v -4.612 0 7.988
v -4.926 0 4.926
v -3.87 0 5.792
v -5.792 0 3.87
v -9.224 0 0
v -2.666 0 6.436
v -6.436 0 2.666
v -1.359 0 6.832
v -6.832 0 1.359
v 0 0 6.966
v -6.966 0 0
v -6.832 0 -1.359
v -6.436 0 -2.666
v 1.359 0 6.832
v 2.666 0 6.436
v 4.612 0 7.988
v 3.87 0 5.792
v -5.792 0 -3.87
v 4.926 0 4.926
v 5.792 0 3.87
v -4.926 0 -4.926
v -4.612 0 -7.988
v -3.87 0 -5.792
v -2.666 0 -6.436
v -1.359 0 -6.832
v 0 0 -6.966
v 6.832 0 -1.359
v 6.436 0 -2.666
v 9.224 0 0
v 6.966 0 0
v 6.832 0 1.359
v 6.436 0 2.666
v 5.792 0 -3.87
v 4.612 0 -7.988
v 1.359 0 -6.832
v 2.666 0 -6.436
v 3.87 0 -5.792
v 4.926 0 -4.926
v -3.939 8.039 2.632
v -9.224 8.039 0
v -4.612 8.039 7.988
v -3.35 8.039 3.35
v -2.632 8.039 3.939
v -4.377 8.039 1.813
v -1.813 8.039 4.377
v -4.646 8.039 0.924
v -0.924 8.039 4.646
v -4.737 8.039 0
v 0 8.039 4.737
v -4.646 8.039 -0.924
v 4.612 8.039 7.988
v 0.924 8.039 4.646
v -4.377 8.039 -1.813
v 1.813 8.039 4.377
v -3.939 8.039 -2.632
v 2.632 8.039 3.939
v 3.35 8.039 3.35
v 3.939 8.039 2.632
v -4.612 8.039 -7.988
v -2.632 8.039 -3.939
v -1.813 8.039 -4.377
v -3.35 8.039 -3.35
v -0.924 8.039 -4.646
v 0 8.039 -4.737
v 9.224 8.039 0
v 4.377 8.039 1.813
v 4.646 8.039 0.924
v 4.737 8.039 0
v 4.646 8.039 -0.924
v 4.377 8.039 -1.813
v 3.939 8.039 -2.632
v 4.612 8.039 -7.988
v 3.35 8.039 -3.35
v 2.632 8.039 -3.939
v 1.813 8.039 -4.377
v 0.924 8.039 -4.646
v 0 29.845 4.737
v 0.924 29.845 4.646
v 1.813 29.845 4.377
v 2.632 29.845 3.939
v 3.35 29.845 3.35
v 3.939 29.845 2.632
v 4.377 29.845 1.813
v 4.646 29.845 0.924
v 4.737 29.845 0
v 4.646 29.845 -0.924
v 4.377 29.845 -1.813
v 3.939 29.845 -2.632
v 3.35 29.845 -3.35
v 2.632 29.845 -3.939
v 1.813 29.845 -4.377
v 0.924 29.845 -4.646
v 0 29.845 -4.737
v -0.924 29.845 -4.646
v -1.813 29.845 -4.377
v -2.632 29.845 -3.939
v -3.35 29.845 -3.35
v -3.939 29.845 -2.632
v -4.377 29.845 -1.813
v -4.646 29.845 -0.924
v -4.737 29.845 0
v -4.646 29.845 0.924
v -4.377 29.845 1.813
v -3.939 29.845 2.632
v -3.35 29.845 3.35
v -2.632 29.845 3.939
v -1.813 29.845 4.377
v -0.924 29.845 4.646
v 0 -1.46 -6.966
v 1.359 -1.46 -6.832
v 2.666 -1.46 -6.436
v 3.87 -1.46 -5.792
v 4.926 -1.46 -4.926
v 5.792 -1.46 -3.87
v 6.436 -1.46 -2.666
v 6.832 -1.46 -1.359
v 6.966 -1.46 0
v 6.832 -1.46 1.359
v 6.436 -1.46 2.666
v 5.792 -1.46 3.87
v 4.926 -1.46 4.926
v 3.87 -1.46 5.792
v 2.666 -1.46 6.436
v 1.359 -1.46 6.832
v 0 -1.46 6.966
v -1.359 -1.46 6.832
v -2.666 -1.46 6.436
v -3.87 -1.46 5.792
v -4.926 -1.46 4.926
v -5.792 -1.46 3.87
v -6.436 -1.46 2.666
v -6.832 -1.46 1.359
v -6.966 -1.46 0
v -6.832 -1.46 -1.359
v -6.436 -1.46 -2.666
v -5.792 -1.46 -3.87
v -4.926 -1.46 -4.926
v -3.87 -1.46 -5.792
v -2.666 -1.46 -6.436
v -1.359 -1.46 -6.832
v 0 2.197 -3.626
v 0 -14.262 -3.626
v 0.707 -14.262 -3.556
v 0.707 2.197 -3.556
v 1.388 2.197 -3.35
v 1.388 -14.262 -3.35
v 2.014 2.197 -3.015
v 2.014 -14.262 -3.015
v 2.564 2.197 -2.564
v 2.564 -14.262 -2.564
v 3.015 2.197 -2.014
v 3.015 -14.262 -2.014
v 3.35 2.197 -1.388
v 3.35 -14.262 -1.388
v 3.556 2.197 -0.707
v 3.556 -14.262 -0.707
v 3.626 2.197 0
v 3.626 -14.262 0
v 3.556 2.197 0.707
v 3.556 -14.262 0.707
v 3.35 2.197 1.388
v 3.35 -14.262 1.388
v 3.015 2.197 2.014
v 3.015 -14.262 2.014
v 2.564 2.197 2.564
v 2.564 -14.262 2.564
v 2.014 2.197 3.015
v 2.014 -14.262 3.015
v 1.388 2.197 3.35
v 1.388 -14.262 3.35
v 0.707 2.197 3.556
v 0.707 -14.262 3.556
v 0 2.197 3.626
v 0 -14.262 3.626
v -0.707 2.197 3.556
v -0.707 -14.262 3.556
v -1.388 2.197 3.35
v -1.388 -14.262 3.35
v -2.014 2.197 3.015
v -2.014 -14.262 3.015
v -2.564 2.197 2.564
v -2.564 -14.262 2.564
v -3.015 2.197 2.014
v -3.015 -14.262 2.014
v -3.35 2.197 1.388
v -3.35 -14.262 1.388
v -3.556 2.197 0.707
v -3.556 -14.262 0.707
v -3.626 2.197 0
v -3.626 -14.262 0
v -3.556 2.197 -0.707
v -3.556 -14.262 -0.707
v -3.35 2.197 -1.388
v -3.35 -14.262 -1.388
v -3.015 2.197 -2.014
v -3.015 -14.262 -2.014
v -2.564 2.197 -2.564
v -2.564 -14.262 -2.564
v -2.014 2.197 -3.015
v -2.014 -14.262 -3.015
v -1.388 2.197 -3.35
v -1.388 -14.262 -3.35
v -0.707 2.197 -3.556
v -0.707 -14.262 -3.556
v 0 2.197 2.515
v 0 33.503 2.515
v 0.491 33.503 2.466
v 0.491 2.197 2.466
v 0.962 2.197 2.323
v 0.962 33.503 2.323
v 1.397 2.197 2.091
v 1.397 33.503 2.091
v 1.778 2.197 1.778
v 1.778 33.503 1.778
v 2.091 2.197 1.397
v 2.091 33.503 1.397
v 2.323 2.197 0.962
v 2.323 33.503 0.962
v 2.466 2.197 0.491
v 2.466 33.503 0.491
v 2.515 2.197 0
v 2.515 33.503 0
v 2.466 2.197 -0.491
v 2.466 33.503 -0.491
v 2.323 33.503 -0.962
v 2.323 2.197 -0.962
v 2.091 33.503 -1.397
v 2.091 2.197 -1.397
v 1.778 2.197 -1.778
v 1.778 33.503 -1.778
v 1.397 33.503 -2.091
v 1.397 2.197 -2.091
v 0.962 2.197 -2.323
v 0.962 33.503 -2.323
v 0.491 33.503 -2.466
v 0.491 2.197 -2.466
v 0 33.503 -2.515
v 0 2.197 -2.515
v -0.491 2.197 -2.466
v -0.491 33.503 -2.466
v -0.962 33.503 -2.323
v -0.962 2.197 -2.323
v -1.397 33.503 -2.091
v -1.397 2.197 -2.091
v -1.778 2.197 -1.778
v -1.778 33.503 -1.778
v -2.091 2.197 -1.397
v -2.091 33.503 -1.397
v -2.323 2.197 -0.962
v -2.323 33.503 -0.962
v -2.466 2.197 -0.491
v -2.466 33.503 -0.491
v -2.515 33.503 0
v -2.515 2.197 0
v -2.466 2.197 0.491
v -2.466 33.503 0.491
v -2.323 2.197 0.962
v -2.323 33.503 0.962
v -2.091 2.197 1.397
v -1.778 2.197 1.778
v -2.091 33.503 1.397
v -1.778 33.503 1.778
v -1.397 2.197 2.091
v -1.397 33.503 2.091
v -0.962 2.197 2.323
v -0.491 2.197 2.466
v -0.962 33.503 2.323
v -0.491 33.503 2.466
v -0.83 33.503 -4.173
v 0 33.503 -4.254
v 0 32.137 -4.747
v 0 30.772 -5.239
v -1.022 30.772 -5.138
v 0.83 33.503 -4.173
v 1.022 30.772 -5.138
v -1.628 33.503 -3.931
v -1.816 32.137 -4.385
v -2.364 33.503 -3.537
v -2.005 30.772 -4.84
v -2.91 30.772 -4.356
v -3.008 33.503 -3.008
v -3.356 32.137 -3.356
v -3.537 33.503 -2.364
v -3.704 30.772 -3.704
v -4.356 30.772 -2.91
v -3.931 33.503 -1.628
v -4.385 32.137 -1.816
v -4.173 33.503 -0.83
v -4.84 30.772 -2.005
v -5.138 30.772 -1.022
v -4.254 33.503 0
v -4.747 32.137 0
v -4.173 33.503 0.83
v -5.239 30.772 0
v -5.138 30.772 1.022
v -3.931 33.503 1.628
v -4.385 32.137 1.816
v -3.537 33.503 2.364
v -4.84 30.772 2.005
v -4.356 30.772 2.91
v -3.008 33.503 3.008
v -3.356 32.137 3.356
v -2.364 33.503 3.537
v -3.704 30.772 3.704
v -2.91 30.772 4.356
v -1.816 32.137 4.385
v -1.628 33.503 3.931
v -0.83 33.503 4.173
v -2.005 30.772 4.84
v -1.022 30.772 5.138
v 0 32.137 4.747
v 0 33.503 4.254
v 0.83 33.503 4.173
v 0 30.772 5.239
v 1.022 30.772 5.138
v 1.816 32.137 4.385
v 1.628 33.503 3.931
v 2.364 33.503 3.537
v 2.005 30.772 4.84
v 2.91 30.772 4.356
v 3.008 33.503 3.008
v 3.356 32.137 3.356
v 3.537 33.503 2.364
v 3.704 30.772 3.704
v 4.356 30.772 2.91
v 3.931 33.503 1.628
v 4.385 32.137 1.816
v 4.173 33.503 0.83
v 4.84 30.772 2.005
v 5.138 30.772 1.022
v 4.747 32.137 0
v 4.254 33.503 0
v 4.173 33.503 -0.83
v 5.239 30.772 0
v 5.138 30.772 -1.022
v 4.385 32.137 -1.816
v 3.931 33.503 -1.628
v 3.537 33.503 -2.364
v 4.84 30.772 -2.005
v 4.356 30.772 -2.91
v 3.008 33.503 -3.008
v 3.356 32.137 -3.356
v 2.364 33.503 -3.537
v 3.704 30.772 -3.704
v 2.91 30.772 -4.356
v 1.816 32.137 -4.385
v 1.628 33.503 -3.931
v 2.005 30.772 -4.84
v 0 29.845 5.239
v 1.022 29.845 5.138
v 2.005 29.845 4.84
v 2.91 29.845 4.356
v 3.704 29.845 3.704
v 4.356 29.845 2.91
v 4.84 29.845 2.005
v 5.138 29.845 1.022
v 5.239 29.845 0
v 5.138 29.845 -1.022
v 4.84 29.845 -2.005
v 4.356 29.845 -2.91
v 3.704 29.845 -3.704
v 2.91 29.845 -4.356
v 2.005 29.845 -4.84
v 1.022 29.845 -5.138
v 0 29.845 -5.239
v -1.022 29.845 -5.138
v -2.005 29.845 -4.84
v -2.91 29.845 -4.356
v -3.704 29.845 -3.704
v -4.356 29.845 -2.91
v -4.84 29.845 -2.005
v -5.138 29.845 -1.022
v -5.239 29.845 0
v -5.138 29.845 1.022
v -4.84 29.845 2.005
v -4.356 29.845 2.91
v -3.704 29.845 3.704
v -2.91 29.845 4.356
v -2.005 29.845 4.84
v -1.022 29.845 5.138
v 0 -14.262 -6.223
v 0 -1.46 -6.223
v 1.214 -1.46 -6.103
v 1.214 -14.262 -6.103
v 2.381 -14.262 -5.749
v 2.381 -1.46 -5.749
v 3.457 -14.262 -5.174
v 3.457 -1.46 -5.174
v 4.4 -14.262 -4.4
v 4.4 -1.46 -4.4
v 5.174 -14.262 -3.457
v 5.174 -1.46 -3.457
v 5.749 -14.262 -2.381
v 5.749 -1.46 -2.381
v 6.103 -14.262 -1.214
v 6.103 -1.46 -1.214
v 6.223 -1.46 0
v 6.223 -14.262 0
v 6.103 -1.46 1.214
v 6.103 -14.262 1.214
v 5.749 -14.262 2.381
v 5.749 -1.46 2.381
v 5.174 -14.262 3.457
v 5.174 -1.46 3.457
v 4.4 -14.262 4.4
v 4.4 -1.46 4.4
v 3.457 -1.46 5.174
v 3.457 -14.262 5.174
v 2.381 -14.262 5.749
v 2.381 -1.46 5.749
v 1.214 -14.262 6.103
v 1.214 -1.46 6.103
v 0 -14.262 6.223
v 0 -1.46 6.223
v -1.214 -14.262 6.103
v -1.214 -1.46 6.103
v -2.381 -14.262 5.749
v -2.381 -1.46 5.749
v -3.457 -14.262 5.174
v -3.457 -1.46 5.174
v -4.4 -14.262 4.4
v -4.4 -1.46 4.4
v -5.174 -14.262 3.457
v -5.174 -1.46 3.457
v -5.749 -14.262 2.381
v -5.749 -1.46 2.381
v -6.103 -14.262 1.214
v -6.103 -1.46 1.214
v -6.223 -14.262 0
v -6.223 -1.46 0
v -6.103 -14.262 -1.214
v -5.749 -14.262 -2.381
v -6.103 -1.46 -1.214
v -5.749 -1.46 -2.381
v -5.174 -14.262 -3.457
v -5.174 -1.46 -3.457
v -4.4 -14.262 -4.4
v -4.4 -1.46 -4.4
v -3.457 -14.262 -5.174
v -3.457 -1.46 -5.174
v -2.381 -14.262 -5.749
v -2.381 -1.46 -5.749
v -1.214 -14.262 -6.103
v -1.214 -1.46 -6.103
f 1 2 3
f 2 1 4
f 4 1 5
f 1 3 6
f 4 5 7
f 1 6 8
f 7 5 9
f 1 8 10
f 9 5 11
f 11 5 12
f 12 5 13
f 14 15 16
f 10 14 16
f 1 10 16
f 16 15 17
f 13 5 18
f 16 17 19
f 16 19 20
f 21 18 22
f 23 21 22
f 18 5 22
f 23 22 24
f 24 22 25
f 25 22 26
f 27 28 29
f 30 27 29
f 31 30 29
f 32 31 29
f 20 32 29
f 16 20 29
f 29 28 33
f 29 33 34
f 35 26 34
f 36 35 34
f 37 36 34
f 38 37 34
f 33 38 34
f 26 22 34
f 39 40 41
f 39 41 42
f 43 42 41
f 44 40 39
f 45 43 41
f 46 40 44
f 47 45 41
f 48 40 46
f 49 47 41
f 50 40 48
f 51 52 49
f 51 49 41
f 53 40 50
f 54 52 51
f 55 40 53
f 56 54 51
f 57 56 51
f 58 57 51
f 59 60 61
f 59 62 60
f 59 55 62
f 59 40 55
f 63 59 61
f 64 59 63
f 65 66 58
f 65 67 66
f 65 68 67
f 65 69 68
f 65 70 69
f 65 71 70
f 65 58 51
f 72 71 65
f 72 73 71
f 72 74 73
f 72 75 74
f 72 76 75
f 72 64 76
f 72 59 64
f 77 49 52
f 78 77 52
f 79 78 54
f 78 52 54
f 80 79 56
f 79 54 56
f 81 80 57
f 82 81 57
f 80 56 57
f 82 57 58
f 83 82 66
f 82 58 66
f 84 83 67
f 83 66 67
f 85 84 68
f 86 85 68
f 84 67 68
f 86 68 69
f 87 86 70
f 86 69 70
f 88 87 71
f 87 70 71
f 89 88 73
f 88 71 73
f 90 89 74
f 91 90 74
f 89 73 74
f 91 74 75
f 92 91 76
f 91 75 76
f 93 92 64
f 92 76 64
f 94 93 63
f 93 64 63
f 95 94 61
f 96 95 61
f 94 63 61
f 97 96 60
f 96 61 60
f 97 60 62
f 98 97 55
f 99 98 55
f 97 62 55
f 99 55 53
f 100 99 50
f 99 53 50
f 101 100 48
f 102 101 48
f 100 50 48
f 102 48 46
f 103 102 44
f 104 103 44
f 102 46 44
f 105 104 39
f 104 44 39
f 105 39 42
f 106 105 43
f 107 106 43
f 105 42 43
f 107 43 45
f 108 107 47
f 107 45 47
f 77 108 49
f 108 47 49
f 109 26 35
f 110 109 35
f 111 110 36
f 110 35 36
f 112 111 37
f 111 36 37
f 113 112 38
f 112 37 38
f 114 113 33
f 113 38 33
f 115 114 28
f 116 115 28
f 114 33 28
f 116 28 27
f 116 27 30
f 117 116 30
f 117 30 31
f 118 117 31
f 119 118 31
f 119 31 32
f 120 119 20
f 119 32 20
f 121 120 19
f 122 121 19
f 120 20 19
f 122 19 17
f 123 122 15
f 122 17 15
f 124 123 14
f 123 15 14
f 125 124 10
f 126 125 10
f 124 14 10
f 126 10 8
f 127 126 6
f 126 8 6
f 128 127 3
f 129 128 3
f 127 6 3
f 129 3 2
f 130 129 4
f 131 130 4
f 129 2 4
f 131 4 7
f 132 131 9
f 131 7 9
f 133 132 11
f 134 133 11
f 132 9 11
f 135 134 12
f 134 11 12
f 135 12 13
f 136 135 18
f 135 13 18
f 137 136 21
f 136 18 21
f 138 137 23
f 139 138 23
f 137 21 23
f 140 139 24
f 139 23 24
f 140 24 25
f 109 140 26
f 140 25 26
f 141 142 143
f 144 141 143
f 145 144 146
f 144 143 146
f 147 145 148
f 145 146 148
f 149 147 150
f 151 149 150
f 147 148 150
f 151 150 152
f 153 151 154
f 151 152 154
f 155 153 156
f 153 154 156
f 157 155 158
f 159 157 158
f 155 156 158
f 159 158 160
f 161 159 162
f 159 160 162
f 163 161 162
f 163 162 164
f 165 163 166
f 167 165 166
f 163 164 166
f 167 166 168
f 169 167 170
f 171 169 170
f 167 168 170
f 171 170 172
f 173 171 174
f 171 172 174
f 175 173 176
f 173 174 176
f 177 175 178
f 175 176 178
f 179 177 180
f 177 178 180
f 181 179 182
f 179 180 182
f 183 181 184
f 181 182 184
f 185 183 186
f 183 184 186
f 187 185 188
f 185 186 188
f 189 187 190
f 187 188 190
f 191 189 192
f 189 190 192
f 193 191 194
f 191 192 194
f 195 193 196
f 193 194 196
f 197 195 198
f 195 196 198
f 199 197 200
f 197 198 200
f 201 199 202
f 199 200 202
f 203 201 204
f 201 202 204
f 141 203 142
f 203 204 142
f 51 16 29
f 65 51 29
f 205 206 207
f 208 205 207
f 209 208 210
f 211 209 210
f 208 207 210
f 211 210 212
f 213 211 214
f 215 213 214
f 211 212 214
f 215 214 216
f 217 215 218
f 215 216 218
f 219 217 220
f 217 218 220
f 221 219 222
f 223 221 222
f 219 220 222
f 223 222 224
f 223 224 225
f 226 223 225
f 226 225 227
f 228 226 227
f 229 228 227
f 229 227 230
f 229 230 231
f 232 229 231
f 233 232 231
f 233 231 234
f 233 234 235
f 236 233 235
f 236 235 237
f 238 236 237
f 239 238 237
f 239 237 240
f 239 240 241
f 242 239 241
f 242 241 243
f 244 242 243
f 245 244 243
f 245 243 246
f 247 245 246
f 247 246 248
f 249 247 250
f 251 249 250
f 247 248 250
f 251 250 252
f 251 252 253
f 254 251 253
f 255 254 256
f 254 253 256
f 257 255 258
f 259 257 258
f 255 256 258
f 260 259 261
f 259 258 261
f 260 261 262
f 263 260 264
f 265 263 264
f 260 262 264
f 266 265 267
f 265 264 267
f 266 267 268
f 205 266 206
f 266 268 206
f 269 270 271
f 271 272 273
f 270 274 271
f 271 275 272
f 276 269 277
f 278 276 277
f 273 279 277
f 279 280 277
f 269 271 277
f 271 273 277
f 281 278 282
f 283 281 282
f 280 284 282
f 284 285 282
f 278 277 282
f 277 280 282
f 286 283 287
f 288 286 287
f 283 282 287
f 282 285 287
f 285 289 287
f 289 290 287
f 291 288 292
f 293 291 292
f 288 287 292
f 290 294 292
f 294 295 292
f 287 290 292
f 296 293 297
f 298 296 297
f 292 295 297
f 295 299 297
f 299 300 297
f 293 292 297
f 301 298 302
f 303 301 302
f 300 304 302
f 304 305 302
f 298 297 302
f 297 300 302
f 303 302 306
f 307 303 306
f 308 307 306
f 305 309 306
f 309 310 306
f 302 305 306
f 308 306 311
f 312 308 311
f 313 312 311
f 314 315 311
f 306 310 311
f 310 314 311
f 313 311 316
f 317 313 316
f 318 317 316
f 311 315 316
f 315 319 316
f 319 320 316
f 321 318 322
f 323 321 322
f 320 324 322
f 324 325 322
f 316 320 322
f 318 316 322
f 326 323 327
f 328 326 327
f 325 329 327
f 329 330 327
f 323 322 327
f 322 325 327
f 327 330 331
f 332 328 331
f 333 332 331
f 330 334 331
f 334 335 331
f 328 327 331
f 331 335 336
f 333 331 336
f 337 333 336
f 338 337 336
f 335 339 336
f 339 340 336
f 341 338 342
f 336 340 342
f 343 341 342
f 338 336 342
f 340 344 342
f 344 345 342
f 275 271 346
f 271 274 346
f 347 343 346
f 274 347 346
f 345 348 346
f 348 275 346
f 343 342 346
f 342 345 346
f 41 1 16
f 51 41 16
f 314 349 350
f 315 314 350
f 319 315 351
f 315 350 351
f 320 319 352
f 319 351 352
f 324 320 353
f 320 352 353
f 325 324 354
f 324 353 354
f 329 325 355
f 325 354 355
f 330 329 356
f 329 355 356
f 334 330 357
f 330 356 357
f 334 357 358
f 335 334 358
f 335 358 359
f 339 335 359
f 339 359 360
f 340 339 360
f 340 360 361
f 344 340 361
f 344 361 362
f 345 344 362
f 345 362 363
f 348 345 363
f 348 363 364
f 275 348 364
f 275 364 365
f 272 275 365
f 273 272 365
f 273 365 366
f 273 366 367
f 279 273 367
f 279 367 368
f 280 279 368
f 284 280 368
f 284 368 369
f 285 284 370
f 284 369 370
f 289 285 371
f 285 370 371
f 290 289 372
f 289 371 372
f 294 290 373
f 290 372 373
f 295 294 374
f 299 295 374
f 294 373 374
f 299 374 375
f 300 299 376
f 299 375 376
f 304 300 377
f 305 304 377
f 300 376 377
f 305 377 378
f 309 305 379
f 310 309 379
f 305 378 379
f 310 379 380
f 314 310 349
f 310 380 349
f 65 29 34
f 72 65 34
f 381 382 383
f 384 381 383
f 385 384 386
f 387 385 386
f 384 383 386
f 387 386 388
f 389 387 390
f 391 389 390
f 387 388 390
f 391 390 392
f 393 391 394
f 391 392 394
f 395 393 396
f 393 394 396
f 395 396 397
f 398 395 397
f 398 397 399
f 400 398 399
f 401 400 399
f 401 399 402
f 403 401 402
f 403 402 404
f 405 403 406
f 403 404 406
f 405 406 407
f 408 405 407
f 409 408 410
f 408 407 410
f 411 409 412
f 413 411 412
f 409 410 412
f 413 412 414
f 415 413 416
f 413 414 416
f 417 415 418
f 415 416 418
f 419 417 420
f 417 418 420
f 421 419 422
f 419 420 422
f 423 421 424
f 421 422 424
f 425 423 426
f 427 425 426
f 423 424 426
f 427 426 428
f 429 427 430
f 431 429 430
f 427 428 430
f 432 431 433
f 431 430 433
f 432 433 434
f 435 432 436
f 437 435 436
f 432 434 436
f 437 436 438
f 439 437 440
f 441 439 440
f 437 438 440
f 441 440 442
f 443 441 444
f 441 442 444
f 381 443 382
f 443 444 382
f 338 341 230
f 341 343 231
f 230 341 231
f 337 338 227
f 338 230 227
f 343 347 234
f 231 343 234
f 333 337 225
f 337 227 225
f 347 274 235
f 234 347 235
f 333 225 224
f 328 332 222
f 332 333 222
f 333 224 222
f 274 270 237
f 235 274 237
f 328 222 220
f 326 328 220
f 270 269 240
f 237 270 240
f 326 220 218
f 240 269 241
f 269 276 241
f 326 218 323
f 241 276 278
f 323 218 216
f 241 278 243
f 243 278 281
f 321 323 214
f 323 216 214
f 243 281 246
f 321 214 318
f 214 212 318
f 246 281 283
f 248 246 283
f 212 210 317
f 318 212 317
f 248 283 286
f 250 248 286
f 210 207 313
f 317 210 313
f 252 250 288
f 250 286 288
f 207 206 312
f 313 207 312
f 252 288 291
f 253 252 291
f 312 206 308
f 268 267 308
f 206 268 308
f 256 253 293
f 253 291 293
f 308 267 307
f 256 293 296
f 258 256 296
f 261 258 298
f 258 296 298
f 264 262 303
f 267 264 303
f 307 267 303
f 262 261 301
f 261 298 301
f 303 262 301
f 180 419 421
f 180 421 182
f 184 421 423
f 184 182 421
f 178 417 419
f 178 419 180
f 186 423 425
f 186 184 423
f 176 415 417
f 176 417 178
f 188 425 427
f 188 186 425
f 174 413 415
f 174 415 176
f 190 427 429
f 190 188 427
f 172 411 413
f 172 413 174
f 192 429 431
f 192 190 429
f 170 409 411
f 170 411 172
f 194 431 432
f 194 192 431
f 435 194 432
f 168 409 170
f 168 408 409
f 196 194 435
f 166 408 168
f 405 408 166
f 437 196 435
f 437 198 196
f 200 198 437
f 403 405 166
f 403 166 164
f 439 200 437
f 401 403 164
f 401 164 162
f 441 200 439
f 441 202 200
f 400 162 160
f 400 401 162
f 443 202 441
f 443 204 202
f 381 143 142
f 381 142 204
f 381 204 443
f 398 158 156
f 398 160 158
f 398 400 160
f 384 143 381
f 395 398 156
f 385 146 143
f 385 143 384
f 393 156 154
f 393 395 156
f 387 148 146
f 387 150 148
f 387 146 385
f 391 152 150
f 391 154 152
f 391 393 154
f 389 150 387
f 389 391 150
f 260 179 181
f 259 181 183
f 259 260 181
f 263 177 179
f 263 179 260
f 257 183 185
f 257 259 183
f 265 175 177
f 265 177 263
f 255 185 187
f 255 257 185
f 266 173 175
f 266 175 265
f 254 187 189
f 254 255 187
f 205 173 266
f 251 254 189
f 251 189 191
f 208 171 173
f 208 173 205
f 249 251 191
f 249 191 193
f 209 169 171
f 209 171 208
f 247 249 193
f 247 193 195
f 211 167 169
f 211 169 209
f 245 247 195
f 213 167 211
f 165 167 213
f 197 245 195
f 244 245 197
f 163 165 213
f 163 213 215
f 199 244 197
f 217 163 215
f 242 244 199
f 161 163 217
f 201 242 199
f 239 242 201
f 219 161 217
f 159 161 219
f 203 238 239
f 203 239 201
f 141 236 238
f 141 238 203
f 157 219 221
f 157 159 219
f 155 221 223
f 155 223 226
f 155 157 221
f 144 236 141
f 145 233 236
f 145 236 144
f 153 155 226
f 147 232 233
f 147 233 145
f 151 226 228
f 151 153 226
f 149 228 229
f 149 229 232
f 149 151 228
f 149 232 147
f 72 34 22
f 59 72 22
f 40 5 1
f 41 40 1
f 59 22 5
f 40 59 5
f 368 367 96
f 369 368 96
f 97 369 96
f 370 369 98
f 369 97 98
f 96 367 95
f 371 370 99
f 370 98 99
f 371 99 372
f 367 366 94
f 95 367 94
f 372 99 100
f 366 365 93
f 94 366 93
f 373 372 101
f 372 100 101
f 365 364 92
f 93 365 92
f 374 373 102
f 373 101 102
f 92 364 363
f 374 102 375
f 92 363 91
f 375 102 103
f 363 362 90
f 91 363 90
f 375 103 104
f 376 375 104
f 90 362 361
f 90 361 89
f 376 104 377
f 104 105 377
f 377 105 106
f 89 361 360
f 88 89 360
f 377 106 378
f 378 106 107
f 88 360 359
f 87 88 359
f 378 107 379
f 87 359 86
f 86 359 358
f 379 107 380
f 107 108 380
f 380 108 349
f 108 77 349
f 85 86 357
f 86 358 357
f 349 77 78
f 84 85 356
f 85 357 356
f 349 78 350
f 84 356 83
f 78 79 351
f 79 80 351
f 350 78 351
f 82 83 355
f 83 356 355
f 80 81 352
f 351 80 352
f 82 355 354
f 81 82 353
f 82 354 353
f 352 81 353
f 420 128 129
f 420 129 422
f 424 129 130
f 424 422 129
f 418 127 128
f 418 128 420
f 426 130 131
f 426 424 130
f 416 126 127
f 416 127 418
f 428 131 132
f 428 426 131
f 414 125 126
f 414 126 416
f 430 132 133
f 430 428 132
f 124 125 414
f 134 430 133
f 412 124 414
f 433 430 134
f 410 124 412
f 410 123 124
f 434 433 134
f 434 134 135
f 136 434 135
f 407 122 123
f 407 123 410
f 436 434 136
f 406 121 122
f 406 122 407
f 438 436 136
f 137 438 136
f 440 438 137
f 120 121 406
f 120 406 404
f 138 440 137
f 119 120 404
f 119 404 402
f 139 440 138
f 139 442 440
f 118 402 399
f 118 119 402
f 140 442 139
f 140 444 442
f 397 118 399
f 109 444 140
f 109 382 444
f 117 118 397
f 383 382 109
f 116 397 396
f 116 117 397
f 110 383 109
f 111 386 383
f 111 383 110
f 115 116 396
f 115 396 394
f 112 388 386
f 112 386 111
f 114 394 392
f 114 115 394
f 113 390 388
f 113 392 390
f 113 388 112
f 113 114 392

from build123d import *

# Parameters (mm, degrees)
BOSS_EXTRUDE1_DEPTH = 8.0391
SKETCH3_R           = 4.7371
BOSS_EXTRUDE2_DEPTH = 21.8059
SKETCH4_R           = 5.23875
BOSS_EXTRUDE3_DEPTH = 0.9271
SKETCH11_R          = 6.96595
BOSS_EXTRUDE4_DEPTH = 1.4605
SKETCH12_R          = 6.223
BOSS_EXTRUDE5_DEPTH = 12.8016
SKETCH24_R          = 2.5146
CUT_EXTRUDE1_DEPTH  = 50.298716199
SKETCH25_R          = 3.62585
CUT_EXTRUDE2_DEPTH  = 16.4592


with BuildPart() as part:
    # Sketch1 → Boss-Extrude1 (new body)
    with BuildSketch(Plane(origin=(0, 0, 0), x_dir=(1, 0, 0), z_dir=(0, 1, 0))):
        Polygon((9.224094311, 0), (4.612047155, 7.9883), (-4.612047155, 7.9883), (-9.224094311, 0), (-4.612047155, -7.9883), (4.612047155, -7.9883), align=None)
    extrude(amount=BOSS_EXTRUDE1_DEPTH)

    # Sketch3 → Boss-Extrude2 (add)
    with BuildSketch(Plane(origin=(0, 8.0391, 0), x_dir=(1, 0, 0), z_dir=(0, 1, 0))):
        with Locations(Location((0, 0, 0), (0, 0, 270))):
            Circle(SKETCH3_R)
    extrude(amount=BOSS_EXTRUDE2_DEPTH)

    # Sketch4 → Boss-Extrude3 (add)
    with BuildSketch(Plane(origin=(0, 29.845, 0), x_dir=(1, 0, 0), z_dir=(0, 1, 0))):
        with Locations(Location((0, 0, 0), (0, 0, 270))):
            Circle(SKETCH4_R)
    extrude(amount=BOSS_EXTRUDE3_DEPTH)

    # Sketch10 → Revolve1 (revolve)
    with BuildSketch(Plane(origin=(0, 0, 0), x_dir=(0, 0, -1), z_dir=(1, 0, 0)), mode=Mode.PRIVATE) as revolve1_sk:
        Polygon((0, 30.7721), (0, 33.5026), (-2.49555, 33.5026), (-4.2545, 33.5026), (-5.23875, 30.7721), align=None)
    revolve(revolve1_sk.sketch.rotate(Axis((0, 30.7721, 0), (0, 1, 0)), 180), axis=Axis((0, 30.7721, 0), (0, 1, 0)))

    # Sketch11 → Boss-Extrude4 (add)
    with BuildSketch(Plane(origin=(0, 0, 0), x_dir=(-1, 0, 0), z_dir=(0, -1, 0))):
        with Locations(Location((0, 0, 0), (0, 0, 90))):
            Circle(SKETCH11_R)
    extrude(amount=BOSS_EXTRUDE4_DEPTH)

    # Sketch12 → Boss-Extrude5 (add)
    with BuildSketch(Plane(origin=(0, -1.4605, 0), x_dir=(-1, 0, 0), z_dir=(0, -1, 0))):
        with Locations(Location((0, 0, 0), (0, 0, 90))):
            Circle(SKETCH12_R)
    extrude(amount=BOSS_EXTRUDE5_DEPTH)

    # Sketch24 → Cut-Extrude1 (cut, through all)
    with BuildSketch(Plane(origin=(0, 33.5026, 0), x_dir=(1, 0, 0), z_dir=(0, 1, 0))):
        with Locations(Location((0, 0, 0), (0, 0, 270))):
            Circle(SKETCH24_R)
    extrude(amount=-CUT_EXTRUDE1_DEPTH, mode=Mode.SUBTRACT)

    # Sketch25 → Cut-Extrude2 (cut)
    with BuildSketch(Plane(origin=(0, -14.2621, 0), x_dir=(-1, 0, 0), z_dir=(0, -1, 0))):
        with Locations(Location((0, 0, 0), (0, 0, 90))):
            Circle(SKETCH25_R)
    extrude(amount=-CUT_EXTRUDE2_DEPTH, mode=Mode.SUBTRACT)


solid = part.part
